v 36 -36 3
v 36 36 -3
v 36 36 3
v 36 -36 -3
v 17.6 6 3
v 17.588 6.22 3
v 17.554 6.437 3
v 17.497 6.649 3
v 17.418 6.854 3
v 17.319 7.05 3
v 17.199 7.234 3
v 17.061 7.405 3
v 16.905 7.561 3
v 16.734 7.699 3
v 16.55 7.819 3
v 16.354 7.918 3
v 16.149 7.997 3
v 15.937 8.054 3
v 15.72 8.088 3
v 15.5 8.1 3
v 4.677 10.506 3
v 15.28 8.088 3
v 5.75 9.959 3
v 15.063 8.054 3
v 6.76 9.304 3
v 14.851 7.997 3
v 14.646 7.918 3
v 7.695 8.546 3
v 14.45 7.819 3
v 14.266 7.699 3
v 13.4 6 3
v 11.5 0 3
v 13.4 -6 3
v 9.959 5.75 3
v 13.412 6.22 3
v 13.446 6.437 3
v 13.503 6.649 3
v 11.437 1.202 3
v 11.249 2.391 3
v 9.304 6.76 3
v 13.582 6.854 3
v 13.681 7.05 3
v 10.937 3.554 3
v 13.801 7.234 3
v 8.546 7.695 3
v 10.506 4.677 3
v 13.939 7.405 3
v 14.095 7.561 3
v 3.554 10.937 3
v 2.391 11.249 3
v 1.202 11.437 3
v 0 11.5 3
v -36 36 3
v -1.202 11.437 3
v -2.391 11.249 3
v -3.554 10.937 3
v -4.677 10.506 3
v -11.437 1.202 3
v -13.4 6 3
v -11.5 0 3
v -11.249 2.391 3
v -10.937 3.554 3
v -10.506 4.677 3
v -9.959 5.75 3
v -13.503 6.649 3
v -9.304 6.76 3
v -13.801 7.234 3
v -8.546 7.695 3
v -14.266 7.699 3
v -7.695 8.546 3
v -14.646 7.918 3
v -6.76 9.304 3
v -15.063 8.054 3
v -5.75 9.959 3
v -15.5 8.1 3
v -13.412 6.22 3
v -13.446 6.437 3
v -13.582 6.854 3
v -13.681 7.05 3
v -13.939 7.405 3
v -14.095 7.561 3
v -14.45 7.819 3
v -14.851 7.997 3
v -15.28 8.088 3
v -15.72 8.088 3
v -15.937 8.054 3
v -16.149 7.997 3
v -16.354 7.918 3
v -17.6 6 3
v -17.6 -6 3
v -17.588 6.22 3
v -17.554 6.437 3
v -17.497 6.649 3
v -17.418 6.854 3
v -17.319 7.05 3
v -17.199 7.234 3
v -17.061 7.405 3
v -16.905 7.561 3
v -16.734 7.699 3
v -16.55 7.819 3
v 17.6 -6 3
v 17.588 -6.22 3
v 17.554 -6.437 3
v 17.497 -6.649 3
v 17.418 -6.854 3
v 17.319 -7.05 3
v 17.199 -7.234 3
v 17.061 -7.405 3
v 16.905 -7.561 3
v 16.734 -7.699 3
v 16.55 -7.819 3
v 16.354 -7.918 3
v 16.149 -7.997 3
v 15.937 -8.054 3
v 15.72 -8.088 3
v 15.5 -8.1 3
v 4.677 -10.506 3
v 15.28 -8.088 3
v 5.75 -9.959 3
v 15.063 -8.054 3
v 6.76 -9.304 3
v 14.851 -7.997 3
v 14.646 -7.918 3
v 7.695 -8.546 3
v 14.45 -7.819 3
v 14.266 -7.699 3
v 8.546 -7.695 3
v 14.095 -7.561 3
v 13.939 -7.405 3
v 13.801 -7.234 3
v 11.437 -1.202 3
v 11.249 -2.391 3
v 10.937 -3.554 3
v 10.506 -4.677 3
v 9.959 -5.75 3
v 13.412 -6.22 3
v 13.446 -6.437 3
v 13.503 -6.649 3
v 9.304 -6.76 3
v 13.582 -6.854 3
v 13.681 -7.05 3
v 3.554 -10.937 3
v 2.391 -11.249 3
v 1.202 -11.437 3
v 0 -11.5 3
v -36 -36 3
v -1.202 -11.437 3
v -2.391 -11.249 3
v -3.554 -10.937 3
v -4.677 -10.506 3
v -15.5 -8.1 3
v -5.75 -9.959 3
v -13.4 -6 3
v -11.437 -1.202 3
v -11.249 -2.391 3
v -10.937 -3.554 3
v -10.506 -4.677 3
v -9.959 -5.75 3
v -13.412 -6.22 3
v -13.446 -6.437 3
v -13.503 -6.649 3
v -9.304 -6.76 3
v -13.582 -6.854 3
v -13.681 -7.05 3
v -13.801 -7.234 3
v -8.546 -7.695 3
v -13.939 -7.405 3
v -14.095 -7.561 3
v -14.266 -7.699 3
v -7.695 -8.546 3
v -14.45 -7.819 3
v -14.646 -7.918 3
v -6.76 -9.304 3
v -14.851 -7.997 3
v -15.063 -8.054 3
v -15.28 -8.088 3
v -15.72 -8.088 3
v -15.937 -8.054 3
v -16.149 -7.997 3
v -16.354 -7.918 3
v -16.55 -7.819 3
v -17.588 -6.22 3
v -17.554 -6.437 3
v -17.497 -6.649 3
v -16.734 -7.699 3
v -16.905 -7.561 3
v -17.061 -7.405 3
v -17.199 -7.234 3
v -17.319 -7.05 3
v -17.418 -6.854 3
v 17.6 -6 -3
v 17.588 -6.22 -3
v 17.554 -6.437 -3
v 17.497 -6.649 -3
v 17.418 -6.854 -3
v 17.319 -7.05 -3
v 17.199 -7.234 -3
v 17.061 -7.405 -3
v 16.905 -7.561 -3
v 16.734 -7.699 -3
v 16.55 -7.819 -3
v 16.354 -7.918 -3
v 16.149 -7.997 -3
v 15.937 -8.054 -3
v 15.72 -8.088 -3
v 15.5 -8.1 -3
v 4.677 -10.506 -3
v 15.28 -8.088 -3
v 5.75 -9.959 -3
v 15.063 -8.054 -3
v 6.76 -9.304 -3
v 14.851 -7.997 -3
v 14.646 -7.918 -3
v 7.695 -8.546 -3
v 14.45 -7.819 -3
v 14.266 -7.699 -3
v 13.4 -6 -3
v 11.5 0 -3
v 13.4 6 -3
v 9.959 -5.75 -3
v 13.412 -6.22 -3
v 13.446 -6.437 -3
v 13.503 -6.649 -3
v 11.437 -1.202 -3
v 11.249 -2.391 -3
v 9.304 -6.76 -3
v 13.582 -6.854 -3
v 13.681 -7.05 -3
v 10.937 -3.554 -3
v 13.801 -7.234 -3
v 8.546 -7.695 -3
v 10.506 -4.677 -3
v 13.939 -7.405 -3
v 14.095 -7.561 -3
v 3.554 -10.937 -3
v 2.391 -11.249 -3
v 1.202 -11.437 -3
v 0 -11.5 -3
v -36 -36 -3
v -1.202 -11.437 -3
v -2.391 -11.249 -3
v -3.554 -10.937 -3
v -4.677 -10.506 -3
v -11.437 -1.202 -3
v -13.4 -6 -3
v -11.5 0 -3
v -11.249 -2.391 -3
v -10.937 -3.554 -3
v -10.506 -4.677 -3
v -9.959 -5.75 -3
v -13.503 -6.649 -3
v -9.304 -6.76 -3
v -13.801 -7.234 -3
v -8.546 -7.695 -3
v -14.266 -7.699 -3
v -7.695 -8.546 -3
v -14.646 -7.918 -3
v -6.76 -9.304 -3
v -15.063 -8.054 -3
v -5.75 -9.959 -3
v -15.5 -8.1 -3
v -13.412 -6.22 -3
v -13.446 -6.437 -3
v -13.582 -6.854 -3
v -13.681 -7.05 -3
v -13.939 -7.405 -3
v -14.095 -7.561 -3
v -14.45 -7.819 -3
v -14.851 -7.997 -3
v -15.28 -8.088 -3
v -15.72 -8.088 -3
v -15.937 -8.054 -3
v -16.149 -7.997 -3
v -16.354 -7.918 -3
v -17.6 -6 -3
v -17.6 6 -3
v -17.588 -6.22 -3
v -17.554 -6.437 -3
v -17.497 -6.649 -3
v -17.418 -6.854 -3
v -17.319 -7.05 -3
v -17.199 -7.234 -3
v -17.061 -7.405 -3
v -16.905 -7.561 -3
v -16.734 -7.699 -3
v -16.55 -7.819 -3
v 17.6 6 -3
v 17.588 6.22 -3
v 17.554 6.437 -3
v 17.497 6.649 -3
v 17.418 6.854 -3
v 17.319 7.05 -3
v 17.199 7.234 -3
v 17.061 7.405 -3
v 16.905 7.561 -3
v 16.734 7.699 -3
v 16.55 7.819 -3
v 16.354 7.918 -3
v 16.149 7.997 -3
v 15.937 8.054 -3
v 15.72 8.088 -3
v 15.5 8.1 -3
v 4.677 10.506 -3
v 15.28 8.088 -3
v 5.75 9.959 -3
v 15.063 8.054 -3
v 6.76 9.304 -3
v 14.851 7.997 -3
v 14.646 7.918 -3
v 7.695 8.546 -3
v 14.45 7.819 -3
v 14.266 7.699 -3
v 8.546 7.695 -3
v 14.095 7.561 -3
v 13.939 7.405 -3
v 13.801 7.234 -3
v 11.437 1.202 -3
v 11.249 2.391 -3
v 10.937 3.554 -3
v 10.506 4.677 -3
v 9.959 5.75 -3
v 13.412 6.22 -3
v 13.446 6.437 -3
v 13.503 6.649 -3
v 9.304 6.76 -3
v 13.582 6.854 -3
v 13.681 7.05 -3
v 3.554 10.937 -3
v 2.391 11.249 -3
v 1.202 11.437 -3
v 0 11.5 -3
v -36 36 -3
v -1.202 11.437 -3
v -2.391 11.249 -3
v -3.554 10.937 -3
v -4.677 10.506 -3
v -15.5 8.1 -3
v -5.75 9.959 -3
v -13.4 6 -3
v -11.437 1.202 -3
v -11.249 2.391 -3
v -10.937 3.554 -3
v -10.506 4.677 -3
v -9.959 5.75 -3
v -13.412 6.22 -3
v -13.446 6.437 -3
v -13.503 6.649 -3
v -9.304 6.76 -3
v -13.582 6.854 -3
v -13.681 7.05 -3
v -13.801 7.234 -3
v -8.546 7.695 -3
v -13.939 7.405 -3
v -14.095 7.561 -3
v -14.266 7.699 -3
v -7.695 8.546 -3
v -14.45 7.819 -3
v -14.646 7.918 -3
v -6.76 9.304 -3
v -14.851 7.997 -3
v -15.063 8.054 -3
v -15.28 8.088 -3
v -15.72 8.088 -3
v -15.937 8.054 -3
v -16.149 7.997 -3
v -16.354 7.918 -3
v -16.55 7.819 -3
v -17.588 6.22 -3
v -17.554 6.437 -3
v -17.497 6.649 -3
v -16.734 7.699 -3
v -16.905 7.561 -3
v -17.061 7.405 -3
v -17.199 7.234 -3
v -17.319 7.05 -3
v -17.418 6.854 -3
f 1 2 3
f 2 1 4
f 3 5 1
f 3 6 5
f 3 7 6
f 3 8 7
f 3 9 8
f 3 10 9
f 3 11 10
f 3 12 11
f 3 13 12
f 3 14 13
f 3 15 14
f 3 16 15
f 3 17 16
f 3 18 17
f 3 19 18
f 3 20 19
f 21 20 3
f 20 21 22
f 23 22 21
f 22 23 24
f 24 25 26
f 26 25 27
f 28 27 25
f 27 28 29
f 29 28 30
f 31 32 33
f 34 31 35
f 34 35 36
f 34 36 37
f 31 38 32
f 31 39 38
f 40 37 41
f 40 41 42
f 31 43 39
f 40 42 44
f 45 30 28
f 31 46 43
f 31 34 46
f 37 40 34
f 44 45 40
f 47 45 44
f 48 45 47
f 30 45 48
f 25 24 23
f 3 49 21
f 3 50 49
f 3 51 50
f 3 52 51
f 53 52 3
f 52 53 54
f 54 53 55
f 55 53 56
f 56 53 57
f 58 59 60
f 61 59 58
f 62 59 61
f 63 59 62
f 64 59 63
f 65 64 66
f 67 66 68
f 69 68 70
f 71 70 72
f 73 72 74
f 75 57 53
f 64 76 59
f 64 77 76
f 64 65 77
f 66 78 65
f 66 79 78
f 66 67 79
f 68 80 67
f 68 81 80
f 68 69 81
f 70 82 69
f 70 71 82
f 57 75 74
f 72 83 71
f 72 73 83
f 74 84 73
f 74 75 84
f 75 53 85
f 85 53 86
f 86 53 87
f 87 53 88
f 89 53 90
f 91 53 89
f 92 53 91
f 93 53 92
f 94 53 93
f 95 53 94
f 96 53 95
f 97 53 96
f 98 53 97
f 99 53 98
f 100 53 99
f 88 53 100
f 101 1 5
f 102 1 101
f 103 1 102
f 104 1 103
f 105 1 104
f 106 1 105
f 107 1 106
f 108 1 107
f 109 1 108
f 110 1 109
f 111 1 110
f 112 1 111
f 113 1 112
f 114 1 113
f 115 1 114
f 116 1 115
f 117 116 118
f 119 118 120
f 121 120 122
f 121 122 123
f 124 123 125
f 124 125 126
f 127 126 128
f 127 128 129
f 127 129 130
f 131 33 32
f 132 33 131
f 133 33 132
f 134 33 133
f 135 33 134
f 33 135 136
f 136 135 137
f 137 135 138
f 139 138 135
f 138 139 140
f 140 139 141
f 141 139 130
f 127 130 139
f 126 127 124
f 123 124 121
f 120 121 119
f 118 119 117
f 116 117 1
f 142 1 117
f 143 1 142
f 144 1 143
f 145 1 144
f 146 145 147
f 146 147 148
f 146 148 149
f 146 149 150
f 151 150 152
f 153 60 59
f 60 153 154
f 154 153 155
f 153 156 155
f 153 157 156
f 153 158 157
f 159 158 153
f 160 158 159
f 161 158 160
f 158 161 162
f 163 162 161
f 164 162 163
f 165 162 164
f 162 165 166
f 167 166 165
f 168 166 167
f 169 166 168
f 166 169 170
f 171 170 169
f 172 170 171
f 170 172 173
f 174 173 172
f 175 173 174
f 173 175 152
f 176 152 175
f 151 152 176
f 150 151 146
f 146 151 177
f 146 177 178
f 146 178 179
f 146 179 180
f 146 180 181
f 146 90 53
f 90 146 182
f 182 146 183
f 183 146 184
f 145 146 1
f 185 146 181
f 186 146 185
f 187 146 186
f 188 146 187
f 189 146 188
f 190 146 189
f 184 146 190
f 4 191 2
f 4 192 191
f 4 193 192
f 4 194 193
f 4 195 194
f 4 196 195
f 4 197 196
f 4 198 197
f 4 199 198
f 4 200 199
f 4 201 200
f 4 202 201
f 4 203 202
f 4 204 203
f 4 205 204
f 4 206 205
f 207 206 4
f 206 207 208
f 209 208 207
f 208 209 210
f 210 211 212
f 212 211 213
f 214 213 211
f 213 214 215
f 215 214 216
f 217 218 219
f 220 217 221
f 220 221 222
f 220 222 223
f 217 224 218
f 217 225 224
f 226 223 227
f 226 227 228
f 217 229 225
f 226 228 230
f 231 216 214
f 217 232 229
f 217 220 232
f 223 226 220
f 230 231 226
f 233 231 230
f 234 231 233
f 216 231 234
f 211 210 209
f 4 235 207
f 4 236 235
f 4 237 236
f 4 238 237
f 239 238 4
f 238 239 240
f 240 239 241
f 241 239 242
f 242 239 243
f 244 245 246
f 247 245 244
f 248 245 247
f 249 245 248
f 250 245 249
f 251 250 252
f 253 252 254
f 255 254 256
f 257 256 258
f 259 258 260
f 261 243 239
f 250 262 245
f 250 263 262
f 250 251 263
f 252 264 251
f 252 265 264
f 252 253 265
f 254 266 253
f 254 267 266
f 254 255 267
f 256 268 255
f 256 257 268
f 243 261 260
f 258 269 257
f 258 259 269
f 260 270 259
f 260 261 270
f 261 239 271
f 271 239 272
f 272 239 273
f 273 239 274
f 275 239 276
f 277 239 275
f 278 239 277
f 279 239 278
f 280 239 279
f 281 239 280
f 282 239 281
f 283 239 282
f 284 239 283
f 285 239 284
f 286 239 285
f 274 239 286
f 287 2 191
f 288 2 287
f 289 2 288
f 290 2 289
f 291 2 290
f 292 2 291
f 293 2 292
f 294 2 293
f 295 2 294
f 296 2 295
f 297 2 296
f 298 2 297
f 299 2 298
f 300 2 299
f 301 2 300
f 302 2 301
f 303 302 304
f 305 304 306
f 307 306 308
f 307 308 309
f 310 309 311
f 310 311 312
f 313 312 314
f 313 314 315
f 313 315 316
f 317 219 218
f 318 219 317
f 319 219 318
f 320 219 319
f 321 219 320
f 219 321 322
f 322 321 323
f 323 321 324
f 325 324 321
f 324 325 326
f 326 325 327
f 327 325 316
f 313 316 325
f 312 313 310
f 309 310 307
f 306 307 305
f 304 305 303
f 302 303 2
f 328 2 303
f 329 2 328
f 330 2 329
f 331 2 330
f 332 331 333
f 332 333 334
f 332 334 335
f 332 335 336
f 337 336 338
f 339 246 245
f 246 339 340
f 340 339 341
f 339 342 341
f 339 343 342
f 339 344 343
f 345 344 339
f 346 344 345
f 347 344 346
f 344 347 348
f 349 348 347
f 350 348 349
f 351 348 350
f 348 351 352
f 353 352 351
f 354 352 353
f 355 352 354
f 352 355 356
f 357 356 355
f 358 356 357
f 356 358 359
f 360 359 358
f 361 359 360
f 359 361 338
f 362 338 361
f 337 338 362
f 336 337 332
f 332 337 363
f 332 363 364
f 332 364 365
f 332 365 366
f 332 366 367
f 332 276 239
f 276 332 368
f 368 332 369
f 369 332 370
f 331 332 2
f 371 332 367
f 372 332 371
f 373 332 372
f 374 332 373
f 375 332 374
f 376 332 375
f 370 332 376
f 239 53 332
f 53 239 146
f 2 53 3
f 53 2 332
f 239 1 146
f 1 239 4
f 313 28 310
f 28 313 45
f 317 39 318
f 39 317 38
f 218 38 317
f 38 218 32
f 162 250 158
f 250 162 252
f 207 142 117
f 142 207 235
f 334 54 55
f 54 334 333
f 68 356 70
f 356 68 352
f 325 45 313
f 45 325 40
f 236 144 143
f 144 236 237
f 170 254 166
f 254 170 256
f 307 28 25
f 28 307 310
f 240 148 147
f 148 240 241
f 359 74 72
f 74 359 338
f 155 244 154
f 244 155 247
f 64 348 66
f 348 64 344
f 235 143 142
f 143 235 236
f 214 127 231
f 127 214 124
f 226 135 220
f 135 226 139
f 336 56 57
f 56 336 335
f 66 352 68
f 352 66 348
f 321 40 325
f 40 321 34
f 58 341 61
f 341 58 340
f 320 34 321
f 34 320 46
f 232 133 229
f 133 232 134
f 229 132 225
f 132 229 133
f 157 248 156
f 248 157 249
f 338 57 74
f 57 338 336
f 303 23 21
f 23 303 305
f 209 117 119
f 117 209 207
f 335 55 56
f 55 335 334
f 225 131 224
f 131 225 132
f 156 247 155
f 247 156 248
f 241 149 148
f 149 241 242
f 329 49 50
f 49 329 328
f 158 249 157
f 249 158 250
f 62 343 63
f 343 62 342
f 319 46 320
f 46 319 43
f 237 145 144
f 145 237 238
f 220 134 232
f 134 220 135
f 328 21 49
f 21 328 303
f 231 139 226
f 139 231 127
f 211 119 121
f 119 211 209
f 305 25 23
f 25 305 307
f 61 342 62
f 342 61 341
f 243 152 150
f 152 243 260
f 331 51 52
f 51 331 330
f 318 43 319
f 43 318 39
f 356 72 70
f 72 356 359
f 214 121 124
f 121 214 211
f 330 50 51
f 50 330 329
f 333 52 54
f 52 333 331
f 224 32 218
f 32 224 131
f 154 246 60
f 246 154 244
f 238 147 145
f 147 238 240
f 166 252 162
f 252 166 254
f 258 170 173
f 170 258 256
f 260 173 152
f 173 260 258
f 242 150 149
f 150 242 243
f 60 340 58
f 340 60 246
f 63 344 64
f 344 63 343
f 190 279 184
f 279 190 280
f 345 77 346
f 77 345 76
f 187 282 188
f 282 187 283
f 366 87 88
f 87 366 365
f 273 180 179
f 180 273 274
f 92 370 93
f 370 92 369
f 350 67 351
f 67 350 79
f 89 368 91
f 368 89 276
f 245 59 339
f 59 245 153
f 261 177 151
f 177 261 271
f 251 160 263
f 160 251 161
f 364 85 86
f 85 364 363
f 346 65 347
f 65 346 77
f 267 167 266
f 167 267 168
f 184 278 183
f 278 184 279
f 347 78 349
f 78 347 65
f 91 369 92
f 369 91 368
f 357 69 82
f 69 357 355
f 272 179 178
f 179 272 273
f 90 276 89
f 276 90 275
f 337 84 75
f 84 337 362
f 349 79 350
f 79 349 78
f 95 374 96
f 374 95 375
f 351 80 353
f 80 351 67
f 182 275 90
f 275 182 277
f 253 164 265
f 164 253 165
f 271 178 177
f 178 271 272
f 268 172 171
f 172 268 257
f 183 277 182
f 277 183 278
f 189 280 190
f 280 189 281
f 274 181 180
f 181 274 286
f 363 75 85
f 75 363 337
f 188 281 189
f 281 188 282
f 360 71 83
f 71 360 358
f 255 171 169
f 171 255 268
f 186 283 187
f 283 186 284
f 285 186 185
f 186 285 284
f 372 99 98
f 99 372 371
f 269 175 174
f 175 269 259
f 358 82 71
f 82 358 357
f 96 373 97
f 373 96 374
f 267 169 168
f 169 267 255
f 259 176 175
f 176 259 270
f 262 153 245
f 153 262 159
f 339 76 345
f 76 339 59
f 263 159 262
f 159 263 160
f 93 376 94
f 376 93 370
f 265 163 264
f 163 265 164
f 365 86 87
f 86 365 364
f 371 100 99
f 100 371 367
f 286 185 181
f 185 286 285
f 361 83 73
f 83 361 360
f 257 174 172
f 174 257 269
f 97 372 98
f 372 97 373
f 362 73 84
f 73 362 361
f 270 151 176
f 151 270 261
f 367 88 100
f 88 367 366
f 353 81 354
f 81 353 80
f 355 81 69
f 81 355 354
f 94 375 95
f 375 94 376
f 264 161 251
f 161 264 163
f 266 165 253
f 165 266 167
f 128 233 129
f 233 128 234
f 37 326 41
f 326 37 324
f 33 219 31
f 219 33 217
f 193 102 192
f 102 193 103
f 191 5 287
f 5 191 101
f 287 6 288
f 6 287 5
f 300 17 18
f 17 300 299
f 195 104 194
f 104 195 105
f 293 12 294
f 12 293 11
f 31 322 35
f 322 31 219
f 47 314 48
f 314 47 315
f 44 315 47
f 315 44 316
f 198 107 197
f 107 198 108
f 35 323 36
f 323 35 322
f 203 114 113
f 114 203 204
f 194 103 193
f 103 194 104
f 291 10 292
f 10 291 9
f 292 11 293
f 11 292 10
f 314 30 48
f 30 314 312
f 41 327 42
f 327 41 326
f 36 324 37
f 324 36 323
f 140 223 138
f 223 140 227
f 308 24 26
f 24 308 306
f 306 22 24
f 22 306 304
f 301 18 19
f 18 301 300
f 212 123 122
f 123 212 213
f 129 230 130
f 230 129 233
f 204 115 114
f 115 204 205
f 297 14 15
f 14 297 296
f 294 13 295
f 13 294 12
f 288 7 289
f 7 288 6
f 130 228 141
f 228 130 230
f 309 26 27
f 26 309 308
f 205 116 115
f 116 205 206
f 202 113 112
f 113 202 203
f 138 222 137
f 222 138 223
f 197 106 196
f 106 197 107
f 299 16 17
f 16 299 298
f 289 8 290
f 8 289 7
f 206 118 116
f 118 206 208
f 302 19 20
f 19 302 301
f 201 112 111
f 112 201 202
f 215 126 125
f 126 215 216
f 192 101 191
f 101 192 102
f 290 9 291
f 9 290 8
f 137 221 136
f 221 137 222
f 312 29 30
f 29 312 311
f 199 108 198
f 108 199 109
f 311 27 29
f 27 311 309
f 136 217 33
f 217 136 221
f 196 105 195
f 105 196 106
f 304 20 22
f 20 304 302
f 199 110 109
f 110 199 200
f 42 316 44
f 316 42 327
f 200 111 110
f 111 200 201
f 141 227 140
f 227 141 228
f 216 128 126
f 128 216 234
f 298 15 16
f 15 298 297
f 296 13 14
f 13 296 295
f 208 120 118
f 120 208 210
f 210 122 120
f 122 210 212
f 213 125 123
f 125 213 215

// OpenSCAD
// NEMA 17 adjustable motor plate, 72 mm square.
$fn = 60;
eps = 0.02;
plate = 72;
plate_t = 6;
hole_pitch = 31;
center_d = 23;
slot_l = 12;
slot_d = 4.2;
module slot(x) {
    hull() {
        translate([x, -slot_l / 2, -plate_t / 2 - eps]) cylinder(d = slot_d, h = plate_t + 2 * eps);
        translate([x, slot_l / 2, -plate_t / 2 - eps]) cylinder(d = slot_d, h = plate_t + 2 * eps);
    }
}
difference() {
    cube([plate, plate, plate_t], center = true);
    translate([0, 0, -plate_t / 2 - eps]) cylinder(d = center_d, h = plate_t + 2 * eps);
    slot(-hole_pitch / 2);
    slot(hole_pitch / 2);
}
